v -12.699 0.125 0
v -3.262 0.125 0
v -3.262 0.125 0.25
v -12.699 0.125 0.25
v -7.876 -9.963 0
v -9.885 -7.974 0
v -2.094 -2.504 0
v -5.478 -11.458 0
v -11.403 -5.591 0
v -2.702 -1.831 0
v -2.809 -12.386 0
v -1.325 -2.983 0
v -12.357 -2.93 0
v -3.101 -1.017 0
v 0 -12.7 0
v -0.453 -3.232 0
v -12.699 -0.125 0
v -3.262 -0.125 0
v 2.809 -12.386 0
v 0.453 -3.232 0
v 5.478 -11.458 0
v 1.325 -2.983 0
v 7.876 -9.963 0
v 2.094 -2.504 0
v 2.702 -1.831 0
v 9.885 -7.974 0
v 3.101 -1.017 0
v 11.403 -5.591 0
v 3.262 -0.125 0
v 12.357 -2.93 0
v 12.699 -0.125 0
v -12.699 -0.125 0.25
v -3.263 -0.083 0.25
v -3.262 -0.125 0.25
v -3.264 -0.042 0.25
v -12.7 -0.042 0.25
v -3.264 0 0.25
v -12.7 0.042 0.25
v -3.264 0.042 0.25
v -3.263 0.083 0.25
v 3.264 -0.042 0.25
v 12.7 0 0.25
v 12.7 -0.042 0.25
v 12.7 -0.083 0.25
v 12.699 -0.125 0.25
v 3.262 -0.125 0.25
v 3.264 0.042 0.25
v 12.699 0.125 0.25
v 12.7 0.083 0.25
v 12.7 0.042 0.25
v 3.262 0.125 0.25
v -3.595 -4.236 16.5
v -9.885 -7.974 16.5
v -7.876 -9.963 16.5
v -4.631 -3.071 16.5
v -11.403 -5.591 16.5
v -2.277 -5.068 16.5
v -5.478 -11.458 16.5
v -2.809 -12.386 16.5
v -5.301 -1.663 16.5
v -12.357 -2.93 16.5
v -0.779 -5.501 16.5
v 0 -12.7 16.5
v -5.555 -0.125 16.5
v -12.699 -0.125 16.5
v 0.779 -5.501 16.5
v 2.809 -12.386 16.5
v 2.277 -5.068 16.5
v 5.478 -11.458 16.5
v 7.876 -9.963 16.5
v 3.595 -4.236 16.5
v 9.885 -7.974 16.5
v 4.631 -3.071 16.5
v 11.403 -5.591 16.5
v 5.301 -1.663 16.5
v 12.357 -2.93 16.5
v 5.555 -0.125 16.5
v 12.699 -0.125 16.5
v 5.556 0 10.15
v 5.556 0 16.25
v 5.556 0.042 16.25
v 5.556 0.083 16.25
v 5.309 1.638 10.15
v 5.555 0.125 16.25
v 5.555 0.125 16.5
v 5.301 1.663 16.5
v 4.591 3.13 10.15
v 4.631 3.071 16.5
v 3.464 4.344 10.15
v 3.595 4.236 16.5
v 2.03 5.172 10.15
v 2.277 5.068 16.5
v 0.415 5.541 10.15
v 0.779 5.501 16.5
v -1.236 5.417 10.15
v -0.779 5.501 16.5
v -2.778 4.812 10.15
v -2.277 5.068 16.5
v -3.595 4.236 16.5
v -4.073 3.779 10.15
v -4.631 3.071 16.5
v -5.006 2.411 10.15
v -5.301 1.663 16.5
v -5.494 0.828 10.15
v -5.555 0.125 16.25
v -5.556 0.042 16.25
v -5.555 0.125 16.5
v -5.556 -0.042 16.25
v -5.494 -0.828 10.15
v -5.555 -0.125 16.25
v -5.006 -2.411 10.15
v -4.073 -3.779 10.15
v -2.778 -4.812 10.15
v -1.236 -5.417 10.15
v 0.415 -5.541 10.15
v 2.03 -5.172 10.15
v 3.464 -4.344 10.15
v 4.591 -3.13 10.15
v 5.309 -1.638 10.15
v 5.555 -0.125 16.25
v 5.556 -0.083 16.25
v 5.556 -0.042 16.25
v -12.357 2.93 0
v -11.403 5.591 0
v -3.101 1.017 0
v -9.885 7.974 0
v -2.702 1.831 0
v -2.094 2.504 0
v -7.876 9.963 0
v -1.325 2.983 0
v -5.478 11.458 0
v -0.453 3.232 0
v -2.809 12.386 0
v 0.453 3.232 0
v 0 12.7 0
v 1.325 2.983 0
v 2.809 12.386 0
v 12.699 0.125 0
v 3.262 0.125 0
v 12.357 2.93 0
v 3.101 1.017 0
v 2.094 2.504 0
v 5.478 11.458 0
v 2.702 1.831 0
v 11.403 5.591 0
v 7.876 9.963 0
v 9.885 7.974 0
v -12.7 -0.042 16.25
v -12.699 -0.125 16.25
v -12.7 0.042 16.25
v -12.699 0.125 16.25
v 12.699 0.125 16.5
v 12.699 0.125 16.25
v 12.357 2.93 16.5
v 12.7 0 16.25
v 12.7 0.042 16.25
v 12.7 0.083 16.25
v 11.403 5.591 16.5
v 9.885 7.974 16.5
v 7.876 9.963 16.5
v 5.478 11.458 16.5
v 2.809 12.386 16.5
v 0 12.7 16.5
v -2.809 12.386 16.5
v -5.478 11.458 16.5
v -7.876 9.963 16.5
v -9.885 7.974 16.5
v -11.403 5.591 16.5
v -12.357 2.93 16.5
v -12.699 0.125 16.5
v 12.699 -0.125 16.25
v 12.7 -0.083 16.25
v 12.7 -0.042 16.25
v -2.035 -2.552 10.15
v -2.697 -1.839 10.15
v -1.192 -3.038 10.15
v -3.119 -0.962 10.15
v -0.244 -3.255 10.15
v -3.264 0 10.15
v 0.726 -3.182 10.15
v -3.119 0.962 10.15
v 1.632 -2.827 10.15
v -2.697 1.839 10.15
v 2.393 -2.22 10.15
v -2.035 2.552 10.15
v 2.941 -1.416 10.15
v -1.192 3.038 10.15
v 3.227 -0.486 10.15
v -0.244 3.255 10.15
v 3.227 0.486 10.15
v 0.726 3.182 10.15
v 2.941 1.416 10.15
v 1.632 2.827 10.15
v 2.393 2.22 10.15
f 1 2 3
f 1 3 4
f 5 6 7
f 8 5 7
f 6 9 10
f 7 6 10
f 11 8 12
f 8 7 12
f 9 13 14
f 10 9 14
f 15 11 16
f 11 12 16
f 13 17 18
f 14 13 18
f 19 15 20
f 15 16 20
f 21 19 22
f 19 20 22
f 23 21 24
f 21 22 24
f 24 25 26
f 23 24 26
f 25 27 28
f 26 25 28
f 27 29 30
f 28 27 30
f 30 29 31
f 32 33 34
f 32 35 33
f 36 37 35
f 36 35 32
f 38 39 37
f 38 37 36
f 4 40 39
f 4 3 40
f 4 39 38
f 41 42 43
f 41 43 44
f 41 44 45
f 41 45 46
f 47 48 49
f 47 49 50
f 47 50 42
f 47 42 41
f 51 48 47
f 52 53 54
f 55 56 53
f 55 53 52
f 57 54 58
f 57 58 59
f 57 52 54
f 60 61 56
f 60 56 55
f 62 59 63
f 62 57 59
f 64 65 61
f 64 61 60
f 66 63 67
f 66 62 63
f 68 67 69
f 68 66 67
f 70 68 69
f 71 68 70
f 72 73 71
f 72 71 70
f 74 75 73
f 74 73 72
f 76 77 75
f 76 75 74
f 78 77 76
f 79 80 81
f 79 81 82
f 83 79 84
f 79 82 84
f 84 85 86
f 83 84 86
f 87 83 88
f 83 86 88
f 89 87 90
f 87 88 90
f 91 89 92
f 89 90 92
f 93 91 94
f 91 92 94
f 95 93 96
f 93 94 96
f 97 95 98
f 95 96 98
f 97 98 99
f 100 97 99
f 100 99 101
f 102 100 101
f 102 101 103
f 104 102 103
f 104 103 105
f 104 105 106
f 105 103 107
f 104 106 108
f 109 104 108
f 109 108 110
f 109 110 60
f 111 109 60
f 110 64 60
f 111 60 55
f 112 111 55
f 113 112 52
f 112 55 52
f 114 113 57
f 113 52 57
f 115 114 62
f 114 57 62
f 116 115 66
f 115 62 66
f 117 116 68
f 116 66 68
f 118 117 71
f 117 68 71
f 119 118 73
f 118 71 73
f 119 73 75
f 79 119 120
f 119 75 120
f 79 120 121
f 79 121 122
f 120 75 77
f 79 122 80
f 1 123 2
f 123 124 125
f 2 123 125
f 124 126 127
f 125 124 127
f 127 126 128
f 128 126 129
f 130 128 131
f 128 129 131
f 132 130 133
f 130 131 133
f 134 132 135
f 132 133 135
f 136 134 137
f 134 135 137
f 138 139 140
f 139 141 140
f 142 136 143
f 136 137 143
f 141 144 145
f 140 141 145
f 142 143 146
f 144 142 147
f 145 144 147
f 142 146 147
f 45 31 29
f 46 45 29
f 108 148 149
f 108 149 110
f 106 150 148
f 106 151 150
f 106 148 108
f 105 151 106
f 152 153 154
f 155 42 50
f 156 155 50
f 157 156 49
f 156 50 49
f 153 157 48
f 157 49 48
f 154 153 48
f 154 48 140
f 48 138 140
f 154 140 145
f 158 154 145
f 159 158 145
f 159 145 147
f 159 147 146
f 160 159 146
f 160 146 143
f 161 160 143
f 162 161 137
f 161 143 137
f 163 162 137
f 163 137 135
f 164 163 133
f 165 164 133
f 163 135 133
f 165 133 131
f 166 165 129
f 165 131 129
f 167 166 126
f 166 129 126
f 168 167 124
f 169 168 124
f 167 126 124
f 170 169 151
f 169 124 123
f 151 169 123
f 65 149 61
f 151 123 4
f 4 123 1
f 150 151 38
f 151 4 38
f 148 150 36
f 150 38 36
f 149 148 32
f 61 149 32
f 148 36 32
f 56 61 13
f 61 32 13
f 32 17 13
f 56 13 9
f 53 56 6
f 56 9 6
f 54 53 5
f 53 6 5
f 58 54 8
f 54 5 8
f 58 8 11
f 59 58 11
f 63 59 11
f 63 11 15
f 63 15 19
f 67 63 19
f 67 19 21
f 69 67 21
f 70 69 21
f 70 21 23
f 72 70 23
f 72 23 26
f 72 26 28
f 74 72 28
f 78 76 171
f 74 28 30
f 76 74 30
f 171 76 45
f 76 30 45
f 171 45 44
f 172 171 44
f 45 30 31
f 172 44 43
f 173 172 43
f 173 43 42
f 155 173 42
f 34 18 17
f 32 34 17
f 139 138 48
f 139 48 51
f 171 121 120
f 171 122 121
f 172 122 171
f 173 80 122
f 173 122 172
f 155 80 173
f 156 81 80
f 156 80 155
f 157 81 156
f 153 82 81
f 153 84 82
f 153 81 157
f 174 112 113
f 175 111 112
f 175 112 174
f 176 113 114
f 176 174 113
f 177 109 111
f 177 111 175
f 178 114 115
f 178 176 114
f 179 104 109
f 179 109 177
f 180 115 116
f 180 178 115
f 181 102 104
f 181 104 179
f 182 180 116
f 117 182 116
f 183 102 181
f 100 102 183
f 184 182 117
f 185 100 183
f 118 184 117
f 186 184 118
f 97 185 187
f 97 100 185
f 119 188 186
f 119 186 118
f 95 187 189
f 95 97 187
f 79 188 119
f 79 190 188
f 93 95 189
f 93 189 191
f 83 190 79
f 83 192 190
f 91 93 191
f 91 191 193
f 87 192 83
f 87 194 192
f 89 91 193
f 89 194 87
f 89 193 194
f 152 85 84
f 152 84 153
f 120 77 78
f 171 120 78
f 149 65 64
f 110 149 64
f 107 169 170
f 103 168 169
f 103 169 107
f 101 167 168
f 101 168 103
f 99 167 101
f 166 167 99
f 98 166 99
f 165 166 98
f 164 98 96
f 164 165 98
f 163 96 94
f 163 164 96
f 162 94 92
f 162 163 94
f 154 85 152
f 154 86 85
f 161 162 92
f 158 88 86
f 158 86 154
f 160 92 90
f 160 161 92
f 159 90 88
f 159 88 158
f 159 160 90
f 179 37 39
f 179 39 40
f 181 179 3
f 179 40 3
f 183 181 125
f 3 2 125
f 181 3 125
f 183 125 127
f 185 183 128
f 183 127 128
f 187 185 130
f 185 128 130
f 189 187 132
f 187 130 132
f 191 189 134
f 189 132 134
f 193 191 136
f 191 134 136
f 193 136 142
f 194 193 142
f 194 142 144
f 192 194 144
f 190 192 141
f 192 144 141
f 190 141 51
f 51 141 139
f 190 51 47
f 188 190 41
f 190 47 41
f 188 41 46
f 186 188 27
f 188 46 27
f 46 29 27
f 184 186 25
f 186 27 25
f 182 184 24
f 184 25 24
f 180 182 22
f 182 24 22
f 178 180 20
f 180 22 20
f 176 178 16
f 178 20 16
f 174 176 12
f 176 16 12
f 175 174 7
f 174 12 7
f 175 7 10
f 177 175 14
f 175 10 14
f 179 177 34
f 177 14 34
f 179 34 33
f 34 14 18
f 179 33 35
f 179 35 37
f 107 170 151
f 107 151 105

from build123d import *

# Parameters (mm, degrees)
SKETCH1_R                                        = 12.7
BASE_EXTRUDE_DEPTH                               = 16.5
CBORE_FOR_1_4_SOCKET_HEAD_CAP_SCREW1_D           = 6.5278
CBORE_FOR_1_4_SOCKET_HEAD_CAP_SCREW1_CBORE_D     = 11.1125
CBORE_FOR_1_4_SOCKET_HEAD_CAP_SCREW1_CBORE_DEPTH = 6.35
SKETCH4_W                                        = 26.942464066
SKETCH4_H                                        = 0.25
VENT_GROOVE_FRONT_DEPTH                          = 0.25
SKETCH5_W                                        = 27.489916166
SKETCH5_H                                        = 0.25
VENT_GROOVE_BACK_DEPTH                           = 0.25


with BuildPart() as part:
    # Sketch1 → Base-Extrude (new body)
    with BuildSketch(Plane.XY):
        Circle(SKETCH1_R)
    extrude(amount=BASE_EXTRUDE_DEPTH)

    # CBORE for 1/4 Socket Head Cap Screw1 (through all)
    with Locations(Plane(origin=(7.46029001, -0.504629161, 16.5), x_dir=(1, 0, 0), z_dir=(0, 0, 1))):
        with Locations((-7.46029001, 0.504629161)):
            CounterBoreHole(CBORE_FOR_1_4_SOCKET_HEAD_CAP_SCREW1_D / 2, CBORE_FOR_1_4_SOCKET_HEAD_CAP_SCREW1_CBORE_D / 2, CBORE_FOR_1_4_SOCKET_HEAD_CAP_SCREW1_CBORE_DEPTH)

    # Sketch4 → Vent Groove Front (cut)
    with BuildSketch(Plane.XY.offset(16.5)):
        with Locations((0.293277911, 0)):
            Rectangle(SKETCH4_W, SKETCH4_H)
    extrude(amount=-VENT_GROOVE_FRONT_DEPTH, mode=Mode.SUBTRACT)

    # Sketch5 → Vent Groove Back (cut)
    with BuildSketch(Plane(origin=(0, 0, 0), x_dir=(-1, 0, 0), z_dir=(0, 0, -1))):
        with Locations((0.254174189, 0)):
            Rectangle(SKETCH5_W, SKETCH5_H)
    extrude(amount=-VENT_GROOVE_BACK_DEPTH, mode=Mode.SUBTRACT)


solid = part.part
